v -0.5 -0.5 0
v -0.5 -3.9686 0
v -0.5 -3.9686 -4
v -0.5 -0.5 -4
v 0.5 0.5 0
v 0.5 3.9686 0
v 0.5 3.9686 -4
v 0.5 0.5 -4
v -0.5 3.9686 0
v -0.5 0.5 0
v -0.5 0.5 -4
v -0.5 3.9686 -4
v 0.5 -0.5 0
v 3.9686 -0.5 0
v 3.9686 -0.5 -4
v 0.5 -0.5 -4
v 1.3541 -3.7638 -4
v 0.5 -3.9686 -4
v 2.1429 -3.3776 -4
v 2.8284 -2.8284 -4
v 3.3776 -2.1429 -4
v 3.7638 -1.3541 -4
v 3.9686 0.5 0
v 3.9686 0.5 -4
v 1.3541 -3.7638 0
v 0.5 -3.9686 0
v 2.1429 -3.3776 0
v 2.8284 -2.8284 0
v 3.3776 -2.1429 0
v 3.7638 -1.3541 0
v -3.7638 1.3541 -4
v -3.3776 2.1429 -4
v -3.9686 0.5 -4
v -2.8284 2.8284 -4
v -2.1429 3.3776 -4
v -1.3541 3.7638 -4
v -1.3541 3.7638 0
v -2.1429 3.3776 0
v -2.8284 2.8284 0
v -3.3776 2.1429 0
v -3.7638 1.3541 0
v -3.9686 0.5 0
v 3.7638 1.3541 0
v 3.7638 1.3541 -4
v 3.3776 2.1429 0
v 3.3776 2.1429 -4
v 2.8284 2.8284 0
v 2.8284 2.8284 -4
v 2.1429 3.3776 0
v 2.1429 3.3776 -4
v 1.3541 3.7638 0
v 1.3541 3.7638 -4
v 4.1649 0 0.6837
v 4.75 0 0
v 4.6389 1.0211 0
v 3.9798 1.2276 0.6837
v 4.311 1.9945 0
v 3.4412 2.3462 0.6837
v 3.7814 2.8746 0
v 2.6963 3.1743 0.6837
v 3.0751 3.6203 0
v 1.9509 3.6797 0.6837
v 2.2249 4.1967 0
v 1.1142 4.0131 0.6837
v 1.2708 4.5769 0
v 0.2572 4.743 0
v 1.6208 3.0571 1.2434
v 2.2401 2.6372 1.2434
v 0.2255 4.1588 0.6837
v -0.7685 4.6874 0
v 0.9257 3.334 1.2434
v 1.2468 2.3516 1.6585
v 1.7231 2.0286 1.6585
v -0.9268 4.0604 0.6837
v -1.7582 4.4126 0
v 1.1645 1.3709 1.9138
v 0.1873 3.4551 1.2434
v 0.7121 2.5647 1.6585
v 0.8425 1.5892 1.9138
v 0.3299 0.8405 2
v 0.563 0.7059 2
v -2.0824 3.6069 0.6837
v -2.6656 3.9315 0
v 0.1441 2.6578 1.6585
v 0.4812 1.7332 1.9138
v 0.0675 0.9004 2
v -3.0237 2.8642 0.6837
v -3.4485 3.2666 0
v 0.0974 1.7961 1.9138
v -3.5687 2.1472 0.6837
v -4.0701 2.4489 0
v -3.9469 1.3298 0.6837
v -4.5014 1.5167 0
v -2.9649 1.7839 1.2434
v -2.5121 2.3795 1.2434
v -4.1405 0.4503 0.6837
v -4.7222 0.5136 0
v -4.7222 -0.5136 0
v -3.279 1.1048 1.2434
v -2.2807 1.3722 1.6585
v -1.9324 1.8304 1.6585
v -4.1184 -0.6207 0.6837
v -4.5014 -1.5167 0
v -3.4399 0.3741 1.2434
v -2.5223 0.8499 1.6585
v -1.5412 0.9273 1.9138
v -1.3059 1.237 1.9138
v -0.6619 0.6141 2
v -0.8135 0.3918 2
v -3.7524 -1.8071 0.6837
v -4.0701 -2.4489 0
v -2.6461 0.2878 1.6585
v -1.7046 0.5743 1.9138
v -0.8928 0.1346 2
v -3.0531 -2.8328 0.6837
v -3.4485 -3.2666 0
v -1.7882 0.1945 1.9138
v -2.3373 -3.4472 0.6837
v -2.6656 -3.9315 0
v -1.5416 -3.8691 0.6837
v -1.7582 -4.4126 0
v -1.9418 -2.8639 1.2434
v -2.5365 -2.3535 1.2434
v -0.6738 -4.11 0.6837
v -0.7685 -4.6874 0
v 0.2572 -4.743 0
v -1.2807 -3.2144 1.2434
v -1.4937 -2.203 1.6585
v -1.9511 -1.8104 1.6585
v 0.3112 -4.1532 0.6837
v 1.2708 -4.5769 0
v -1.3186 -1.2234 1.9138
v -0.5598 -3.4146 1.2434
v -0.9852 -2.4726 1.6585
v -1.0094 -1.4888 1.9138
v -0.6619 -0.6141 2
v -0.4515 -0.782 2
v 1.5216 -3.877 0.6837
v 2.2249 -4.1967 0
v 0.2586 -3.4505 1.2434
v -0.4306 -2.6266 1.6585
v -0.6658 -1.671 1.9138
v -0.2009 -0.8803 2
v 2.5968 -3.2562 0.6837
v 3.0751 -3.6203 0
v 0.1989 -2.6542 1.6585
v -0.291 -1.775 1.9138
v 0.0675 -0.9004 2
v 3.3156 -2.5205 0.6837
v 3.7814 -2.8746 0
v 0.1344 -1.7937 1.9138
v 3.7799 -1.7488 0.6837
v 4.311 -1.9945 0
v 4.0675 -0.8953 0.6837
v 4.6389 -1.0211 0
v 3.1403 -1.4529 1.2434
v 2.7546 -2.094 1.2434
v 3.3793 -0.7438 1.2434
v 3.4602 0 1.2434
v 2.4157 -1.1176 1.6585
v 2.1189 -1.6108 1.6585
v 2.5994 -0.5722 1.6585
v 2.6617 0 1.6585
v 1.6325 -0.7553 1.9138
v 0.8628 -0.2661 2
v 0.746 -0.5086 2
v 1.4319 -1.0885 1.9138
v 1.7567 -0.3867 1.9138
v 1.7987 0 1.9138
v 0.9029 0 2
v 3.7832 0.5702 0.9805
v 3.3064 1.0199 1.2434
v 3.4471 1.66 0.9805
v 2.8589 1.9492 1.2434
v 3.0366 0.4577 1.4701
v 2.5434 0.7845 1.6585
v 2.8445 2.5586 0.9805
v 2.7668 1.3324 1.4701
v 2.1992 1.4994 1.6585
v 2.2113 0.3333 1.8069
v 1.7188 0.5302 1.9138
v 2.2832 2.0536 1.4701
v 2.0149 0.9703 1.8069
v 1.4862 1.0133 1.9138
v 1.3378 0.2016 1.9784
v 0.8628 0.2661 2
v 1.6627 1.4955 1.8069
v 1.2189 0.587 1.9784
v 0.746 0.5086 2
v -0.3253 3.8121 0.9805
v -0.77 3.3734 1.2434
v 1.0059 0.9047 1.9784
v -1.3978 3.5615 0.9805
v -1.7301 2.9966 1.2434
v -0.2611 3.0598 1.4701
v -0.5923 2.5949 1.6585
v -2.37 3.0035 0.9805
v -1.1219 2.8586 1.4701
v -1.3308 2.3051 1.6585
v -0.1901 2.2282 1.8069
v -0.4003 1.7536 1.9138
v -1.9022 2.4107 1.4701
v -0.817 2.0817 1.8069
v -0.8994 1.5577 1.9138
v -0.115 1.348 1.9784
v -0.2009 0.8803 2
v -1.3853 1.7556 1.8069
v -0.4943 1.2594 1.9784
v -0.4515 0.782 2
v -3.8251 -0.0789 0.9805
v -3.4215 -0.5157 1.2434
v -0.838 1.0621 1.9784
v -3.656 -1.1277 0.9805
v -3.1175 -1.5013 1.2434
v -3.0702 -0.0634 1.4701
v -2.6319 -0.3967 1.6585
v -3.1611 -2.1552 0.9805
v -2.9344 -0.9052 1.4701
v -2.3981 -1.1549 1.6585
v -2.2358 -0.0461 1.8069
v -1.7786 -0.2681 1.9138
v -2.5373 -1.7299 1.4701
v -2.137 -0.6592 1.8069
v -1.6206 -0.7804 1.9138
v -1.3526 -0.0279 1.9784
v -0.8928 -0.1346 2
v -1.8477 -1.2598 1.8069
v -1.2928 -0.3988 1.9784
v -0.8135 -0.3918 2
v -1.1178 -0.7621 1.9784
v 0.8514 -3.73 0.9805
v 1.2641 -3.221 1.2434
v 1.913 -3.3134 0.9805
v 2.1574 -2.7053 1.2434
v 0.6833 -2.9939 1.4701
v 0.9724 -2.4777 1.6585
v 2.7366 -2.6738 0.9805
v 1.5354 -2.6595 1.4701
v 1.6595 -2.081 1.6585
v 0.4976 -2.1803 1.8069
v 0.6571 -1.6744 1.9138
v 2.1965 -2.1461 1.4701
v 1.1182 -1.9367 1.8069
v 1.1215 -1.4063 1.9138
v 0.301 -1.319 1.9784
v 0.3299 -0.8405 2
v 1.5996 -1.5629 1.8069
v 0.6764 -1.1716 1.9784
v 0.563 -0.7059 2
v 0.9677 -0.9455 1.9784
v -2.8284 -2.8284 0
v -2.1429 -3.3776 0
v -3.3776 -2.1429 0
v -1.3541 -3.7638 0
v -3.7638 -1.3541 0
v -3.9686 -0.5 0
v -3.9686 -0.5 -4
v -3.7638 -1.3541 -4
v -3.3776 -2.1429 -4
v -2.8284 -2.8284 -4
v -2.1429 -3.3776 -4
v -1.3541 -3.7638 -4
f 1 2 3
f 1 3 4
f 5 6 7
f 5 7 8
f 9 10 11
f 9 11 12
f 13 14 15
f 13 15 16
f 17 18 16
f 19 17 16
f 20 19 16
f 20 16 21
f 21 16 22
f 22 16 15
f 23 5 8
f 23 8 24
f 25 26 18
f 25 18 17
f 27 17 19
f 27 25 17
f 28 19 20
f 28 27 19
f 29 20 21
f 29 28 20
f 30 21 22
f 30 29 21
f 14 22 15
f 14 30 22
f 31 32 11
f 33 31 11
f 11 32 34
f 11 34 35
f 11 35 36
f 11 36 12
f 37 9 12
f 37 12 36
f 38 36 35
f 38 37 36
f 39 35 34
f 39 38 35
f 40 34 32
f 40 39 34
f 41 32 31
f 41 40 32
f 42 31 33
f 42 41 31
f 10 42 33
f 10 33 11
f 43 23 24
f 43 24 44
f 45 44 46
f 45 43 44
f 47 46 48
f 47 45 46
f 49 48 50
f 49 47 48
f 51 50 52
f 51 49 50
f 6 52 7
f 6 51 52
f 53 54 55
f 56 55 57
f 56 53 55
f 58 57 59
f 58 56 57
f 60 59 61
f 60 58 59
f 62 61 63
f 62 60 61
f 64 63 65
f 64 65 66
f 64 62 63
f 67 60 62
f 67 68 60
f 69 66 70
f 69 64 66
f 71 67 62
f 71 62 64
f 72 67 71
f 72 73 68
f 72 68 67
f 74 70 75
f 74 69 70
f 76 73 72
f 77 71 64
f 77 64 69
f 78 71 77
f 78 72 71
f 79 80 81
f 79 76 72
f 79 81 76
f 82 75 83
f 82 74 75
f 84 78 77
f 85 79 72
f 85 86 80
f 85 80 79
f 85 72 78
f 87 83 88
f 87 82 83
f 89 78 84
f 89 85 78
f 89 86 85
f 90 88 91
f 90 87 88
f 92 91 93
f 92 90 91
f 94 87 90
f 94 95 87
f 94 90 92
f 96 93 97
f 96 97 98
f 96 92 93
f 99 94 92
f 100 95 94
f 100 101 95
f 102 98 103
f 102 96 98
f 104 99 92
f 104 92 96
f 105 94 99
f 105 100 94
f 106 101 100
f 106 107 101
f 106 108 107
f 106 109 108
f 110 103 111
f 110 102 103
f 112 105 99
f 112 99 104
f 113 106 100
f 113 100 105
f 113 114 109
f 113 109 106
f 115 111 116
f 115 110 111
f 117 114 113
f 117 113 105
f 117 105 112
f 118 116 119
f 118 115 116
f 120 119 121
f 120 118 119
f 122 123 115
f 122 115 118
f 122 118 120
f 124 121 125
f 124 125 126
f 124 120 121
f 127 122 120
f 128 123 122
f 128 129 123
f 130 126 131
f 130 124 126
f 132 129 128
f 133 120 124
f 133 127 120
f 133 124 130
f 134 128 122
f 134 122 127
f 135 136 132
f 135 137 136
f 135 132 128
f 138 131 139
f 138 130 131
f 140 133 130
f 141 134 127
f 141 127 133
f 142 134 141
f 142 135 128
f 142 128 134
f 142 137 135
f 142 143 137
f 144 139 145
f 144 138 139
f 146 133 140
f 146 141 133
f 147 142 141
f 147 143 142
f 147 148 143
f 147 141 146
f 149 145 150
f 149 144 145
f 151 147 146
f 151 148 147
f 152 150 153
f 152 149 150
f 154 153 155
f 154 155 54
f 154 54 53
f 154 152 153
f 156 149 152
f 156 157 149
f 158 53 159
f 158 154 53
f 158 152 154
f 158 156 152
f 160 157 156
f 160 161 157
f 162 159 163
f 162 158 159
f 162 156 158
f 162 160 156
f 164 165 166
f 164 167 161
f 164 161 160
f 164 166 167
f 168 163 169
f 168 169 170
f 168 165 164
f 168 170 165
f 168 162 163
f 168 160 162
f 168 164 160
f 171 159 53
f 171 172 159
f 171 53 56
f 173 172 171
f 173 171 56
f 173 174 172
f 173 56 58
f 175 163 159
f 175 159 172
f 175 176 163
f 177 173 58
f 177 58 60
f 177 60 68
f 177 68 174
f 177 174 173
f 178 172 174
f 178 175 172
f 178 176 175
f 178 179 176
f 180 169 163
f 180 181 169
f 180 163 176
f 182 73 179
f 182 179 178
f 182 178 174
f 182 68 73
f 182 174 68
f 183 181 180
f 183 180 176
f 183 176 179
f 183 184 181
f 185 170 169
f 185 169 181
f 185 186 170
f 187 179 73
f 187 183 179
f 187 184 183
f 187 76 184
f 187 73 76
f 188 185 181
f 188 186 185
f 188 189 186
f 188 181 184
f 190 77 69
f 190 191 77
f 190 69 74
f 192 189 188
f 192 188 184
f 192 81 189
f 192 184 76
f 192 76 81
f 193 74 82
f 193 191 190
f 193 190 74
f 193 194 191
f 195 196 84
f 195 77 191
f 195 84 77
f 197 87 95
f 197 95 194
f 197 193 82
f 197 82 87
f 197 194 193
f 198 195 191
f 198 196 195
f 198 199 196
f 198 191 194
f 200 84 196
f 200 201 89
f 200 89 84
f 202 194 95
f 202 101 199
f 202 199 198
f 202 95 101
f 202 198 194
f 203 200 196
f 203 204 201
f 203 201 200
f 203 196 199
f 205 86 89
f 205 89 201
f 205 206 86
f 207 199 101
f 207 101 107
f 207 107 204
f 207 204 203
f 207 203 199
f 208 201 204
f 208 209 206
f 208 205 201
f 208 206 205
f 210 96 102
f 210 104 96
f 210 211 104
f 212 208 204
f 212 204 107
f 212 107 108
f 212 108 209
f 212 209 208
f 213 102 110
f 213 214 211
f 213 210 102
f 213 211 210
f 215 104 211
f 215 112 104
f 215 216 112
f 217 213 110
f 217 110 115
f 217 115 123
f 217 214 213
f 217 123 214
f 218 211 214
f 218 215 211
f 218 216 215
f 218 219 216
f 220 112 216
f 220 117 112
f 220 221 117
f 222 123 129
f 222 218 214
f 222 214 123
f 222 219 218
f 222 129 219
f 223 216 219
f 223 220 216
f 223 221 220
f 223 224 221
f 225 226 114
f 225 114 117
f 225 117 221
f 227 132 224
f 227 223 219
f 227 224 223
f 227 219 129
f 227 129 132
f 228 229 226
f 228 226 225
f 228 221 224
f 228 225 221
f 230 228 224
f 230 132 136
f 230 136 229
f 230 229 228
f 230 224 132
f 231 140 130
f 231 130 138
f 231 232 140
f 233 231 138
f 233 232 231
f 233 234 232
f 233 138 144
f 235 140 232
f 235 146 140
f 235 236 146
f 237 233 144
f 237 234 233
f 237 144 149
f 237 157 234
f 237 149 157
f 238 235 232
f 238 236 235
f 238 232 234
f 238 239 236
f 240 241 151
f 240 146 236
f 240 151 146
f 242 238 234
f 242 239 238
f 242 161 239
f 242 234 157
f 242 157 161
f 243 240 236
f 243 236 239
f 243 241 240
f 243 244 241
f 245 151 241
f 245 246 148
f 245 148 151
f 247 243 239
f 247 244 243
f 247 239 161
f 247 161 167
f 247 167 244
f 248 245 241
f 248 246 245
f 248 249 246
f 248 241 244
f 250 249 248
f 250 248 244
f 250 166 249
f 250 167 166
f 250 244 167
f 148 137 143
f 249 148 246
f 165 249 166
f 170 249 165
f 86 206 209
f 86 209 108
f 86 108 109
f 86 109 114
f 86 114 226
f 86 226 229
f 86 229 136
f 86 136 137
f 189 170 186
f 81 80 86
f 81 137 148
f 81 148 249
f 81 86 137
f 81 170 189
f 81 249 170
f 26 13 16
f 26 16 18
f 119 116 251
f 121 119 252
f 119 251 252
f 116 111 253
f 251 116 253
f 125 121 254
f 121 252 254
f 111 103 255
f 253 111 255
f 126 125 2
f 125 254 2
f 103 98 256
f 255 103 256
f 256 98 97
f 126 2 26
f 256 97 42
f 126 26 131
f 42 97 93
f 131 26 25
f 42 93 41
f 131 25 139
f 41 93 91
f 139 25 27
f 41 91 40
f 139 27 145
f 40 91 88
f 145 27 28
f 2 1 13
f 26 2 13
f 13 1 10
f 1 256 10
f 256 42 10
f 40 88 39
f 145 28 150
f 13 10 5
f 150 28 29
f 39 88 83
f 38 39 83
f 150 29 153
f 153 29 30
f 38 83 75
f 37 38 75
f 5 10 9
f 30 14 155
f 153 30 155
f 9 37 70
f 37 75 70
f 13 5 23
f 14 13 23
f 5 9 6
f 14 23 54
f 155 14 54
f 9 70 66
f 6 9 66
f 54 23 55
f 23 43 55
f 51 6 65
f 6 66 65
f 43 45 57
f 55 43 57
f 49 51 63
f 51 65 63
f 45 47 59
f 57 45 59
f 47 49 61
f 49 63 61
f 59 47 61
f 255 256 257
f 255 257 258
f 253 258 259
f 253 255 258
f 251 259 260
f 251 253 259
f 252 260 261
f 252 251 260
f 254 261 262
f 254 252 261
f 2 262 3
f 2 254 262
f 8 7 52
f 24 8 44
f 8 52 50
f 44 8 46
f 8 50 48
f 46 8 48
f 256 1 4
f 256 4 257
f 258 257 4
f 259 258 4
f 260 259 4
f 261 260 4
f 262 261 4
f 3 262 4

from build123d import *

# Parameters (mm, degrees)
F0_R     = 4.75
F1_DEPTH = 2
F2_DEPTH = 4


# Not quite as in the source:
# - a fillet or chamfer that OpenCascade refuses, or shapes differently, is made with other operations: its cross-section is extruded or revolved along the edge and cut away or added
# - a feature names something its author has since deleted; it is built from what else it names


with BuildPart() as f1:
    # F0 (on Top) → F1 (new body)
    with BuildSketch(Plane.XY):
        Circle(F0_R)
        with BuildLine():
            ThreePointArc((-0.5, -3.9686269666), (-2.8284271247, -2.8284271247), (-3.9686269666, -0.5))
            Line((-3.9686269666, -0.5), (-2.7549954628, -0.5))
            Line((-2.7549954628, -0.5), (-0.5, -0.5))
            Line((-0.5, -0.5), (-0.5, -2.7549954628))
            Line((-0.5, -2.7549954628), (-0.5, -3.9686269666))
        make_face(mode=Mode.SUBTRACT)
        with BuildLine():
            Line((0.5, -0.5), (2.7549954628, -0.5))
            Line((2.7549954628, -0.5), (3.9686269666, -0.5))
            ThreePointArc((3.9686269666, -0.5), (2.8284271247, -2.8284271247), (0.5, -3.9686269666))
            Line((0.5, -3.9686269666), (0.5, -2.7549954628))
            Line((0.5, -2.7549954628), (0.5, -0.5))
        make_face(mode=Mode.SUBTRACT)
        with BuildLine():
            Line((-2.7549954628, 0.5), (-3.9686269666, 0.5))
            ThreePointArc((-3.9686269666, 0.5), (-2.8284271247, 2.8284271247), (-0.5, 3.9686269666))
            Line((-0.5, 3.9686269666), (-0.5, 2.7549954628))
            Line((-0.5, 2.7549954628), (-0.5, 0.5))
            Line((-0.5, 0.5), (-2.7549954628, 0.5))
        make_face(mode=Mode.SUBTRACT)
        with BuildLine():
            Line((3.9686269666, 0.5), (2.7549954628, 0.5))
            Line((2.7549954628, 0.5), (0.5, 0.5))
            Line((0.5, 0.5), (0.5, 2.7549954628))
            Line((0.5, 2.7549954628), (0.5, 3.9686269666))
            ThreePointArc((0.5, 3.9686269666), (2.8284271247, 2.8284271247), (3.9686269666, 0.5))
        make_face(mode=Mode.SUBTRACT)
        with BuildLine():
            Line((-2.7549954628, -0.5), (-3.9686269666, -0.5))
            ThreePointArc((-3.9686269666, -0.5), (-2.8284271247, -2.8284271247), (-0.5, -3.9686269666))
            Line((-0.5, -3.9686269666), (-0.5, -2.7549954628))
            Line((-0.5, -2.7549954628), (-0.5, -0.5))
            Line((-0.5, -0.5), (-2.7549954628, -0.5))
        make_face()
        with BuildLine():
            ThreePointArc((-0.5, 3.9686269666), (-2.8284271247, 2.8284271247), (-3.9686269666, 0.5))
            Line((-3.9686269666, 0.5), (-2.7549954628, 0.5))
            Line((-2.7549954628, 0.5), (-0.5, 0.5))
            Line((-0.5, 0.5), (-0.5, 2.7549954628))
            Line((-0.5, 2.7549954628), (-0.5, 3.9686269666))
        make_face()
        with BuildLine():
            Line((0.5, 0.5), (2.7549954628, 0.5))
            Line((2.7549954628, 0.5), (3.9686269666, 0.5))
            ThreePointArc((3.9686269666, 0.5), (2.8284271247, 2.8284271247), (0.5, 3.9686269666))
            Line((0.5, 3.9686269666), (0.5, 2.7549954628))
            Line((0.5, 2.7549954628), (0.5, 0.5))
        make_face()
        with BuildLine():
            Line((3.9686269666, -0.5), (2.7549954628, -0.5))
            Line((2.7549954628, -0.5), (0.5, -0.5))
            Line((0.5, -0.5), (0.5, -2.7549954628))
            Line((0.5, -2.7549954628), (0.5, -3.9686269666))
            ThreePointArc((0.5, -3.9686269666), (2.8284271247, -2.8284271247), (3.9686269666, -0.5))
        make_face()
    extrude(amount=F1_DEPTH)

    # F0 (on Top) → F2 (join)
    with BuildSketch(Plane.XY):
        with BuildLine():
            ThreePointArc((-0.5, 3.9686269666), (-2.8284271247, 2.8284271247), (-3.9686269666, 0.5))
            Line((-3.9686269666, 0.5), (-2.7549954628, 0.5))
            Line((-2.7549954628, 0.5), (-0.5, 0.5))
            Line((-0.5, 0.5), (-0.5, 2.7549954628))
            Line((-0.5, 2.7549954628), (-0.5, 3.9686269666))
        make_face()
        with BuildLine():
            Line((-2.7549954628, -0.5), (-3.9686269666, -0.5))
            ThreePointArc((-3.9686269666, -0.5), (-2.8284271247, -2.8284271247), (-0.5, -3.9686269666))
            Line((-0.5, -3.9686269666), (-0.5, -2.7549954628))
            Line((-0.5, -2.7549954628), (-0.5, -0.5))
            Line((-0.5, -0.5), (-2.7549954628, -0.5))
        make_face()
        with BuildLine():
            Line((3.9686269666, -0.5), (2.7549954628, -0.5))
            Line((2.7549954628, -0.5), (0.5, -0.5))
            Line((0.5, -0.5), (0.5, -2.7549954628))
            Line((0.5, -2.7549954628), (0.5, -3.9686269666))
            ThreePointArc((0.5, -3.9686269666), (2.8284271247, -2.8284271247), (3.9686269666, -0.5))
        make_face()
        with BuildLine():
            Line((0.5, 0.5), (2.7549954628, 0.5))
            Line((2.7549954628, 0.5), (3.9686269666, 0.5))
            ThreePointArc((3.9686269666, 0.5), (2.8284271247, 2.8284271247), (0.5, 3.9686269666))
            Line((0.5, 3.9686269666), (0.5, 2.7549954628))
            Line((0.5, 2.7549954628), (0.5, 0.5))
        make_face()
    extrude(amount=-F2_DEPTH)

    # F3: fillet of radius 4.7 on 1 edges, made by hand

    # F3_s1 → F3_t2 (revolve, cut)
    with BuildSketch(Plane.XZ):
        with BuildLine():
            ThreePointArc((4.75, 0), (3.0708715265, 1.4701318924), (0.9029231877, 2))
            Line((0.9029231877, 2), (4.75, 2))
            Line((4.75, 2), (4.75, 0))
        make_face()
    revolve(axis=Axis((0, 0, 2), (0, 0, 1)), mode=Mode.SUBTRACT)


solid = f1.part
